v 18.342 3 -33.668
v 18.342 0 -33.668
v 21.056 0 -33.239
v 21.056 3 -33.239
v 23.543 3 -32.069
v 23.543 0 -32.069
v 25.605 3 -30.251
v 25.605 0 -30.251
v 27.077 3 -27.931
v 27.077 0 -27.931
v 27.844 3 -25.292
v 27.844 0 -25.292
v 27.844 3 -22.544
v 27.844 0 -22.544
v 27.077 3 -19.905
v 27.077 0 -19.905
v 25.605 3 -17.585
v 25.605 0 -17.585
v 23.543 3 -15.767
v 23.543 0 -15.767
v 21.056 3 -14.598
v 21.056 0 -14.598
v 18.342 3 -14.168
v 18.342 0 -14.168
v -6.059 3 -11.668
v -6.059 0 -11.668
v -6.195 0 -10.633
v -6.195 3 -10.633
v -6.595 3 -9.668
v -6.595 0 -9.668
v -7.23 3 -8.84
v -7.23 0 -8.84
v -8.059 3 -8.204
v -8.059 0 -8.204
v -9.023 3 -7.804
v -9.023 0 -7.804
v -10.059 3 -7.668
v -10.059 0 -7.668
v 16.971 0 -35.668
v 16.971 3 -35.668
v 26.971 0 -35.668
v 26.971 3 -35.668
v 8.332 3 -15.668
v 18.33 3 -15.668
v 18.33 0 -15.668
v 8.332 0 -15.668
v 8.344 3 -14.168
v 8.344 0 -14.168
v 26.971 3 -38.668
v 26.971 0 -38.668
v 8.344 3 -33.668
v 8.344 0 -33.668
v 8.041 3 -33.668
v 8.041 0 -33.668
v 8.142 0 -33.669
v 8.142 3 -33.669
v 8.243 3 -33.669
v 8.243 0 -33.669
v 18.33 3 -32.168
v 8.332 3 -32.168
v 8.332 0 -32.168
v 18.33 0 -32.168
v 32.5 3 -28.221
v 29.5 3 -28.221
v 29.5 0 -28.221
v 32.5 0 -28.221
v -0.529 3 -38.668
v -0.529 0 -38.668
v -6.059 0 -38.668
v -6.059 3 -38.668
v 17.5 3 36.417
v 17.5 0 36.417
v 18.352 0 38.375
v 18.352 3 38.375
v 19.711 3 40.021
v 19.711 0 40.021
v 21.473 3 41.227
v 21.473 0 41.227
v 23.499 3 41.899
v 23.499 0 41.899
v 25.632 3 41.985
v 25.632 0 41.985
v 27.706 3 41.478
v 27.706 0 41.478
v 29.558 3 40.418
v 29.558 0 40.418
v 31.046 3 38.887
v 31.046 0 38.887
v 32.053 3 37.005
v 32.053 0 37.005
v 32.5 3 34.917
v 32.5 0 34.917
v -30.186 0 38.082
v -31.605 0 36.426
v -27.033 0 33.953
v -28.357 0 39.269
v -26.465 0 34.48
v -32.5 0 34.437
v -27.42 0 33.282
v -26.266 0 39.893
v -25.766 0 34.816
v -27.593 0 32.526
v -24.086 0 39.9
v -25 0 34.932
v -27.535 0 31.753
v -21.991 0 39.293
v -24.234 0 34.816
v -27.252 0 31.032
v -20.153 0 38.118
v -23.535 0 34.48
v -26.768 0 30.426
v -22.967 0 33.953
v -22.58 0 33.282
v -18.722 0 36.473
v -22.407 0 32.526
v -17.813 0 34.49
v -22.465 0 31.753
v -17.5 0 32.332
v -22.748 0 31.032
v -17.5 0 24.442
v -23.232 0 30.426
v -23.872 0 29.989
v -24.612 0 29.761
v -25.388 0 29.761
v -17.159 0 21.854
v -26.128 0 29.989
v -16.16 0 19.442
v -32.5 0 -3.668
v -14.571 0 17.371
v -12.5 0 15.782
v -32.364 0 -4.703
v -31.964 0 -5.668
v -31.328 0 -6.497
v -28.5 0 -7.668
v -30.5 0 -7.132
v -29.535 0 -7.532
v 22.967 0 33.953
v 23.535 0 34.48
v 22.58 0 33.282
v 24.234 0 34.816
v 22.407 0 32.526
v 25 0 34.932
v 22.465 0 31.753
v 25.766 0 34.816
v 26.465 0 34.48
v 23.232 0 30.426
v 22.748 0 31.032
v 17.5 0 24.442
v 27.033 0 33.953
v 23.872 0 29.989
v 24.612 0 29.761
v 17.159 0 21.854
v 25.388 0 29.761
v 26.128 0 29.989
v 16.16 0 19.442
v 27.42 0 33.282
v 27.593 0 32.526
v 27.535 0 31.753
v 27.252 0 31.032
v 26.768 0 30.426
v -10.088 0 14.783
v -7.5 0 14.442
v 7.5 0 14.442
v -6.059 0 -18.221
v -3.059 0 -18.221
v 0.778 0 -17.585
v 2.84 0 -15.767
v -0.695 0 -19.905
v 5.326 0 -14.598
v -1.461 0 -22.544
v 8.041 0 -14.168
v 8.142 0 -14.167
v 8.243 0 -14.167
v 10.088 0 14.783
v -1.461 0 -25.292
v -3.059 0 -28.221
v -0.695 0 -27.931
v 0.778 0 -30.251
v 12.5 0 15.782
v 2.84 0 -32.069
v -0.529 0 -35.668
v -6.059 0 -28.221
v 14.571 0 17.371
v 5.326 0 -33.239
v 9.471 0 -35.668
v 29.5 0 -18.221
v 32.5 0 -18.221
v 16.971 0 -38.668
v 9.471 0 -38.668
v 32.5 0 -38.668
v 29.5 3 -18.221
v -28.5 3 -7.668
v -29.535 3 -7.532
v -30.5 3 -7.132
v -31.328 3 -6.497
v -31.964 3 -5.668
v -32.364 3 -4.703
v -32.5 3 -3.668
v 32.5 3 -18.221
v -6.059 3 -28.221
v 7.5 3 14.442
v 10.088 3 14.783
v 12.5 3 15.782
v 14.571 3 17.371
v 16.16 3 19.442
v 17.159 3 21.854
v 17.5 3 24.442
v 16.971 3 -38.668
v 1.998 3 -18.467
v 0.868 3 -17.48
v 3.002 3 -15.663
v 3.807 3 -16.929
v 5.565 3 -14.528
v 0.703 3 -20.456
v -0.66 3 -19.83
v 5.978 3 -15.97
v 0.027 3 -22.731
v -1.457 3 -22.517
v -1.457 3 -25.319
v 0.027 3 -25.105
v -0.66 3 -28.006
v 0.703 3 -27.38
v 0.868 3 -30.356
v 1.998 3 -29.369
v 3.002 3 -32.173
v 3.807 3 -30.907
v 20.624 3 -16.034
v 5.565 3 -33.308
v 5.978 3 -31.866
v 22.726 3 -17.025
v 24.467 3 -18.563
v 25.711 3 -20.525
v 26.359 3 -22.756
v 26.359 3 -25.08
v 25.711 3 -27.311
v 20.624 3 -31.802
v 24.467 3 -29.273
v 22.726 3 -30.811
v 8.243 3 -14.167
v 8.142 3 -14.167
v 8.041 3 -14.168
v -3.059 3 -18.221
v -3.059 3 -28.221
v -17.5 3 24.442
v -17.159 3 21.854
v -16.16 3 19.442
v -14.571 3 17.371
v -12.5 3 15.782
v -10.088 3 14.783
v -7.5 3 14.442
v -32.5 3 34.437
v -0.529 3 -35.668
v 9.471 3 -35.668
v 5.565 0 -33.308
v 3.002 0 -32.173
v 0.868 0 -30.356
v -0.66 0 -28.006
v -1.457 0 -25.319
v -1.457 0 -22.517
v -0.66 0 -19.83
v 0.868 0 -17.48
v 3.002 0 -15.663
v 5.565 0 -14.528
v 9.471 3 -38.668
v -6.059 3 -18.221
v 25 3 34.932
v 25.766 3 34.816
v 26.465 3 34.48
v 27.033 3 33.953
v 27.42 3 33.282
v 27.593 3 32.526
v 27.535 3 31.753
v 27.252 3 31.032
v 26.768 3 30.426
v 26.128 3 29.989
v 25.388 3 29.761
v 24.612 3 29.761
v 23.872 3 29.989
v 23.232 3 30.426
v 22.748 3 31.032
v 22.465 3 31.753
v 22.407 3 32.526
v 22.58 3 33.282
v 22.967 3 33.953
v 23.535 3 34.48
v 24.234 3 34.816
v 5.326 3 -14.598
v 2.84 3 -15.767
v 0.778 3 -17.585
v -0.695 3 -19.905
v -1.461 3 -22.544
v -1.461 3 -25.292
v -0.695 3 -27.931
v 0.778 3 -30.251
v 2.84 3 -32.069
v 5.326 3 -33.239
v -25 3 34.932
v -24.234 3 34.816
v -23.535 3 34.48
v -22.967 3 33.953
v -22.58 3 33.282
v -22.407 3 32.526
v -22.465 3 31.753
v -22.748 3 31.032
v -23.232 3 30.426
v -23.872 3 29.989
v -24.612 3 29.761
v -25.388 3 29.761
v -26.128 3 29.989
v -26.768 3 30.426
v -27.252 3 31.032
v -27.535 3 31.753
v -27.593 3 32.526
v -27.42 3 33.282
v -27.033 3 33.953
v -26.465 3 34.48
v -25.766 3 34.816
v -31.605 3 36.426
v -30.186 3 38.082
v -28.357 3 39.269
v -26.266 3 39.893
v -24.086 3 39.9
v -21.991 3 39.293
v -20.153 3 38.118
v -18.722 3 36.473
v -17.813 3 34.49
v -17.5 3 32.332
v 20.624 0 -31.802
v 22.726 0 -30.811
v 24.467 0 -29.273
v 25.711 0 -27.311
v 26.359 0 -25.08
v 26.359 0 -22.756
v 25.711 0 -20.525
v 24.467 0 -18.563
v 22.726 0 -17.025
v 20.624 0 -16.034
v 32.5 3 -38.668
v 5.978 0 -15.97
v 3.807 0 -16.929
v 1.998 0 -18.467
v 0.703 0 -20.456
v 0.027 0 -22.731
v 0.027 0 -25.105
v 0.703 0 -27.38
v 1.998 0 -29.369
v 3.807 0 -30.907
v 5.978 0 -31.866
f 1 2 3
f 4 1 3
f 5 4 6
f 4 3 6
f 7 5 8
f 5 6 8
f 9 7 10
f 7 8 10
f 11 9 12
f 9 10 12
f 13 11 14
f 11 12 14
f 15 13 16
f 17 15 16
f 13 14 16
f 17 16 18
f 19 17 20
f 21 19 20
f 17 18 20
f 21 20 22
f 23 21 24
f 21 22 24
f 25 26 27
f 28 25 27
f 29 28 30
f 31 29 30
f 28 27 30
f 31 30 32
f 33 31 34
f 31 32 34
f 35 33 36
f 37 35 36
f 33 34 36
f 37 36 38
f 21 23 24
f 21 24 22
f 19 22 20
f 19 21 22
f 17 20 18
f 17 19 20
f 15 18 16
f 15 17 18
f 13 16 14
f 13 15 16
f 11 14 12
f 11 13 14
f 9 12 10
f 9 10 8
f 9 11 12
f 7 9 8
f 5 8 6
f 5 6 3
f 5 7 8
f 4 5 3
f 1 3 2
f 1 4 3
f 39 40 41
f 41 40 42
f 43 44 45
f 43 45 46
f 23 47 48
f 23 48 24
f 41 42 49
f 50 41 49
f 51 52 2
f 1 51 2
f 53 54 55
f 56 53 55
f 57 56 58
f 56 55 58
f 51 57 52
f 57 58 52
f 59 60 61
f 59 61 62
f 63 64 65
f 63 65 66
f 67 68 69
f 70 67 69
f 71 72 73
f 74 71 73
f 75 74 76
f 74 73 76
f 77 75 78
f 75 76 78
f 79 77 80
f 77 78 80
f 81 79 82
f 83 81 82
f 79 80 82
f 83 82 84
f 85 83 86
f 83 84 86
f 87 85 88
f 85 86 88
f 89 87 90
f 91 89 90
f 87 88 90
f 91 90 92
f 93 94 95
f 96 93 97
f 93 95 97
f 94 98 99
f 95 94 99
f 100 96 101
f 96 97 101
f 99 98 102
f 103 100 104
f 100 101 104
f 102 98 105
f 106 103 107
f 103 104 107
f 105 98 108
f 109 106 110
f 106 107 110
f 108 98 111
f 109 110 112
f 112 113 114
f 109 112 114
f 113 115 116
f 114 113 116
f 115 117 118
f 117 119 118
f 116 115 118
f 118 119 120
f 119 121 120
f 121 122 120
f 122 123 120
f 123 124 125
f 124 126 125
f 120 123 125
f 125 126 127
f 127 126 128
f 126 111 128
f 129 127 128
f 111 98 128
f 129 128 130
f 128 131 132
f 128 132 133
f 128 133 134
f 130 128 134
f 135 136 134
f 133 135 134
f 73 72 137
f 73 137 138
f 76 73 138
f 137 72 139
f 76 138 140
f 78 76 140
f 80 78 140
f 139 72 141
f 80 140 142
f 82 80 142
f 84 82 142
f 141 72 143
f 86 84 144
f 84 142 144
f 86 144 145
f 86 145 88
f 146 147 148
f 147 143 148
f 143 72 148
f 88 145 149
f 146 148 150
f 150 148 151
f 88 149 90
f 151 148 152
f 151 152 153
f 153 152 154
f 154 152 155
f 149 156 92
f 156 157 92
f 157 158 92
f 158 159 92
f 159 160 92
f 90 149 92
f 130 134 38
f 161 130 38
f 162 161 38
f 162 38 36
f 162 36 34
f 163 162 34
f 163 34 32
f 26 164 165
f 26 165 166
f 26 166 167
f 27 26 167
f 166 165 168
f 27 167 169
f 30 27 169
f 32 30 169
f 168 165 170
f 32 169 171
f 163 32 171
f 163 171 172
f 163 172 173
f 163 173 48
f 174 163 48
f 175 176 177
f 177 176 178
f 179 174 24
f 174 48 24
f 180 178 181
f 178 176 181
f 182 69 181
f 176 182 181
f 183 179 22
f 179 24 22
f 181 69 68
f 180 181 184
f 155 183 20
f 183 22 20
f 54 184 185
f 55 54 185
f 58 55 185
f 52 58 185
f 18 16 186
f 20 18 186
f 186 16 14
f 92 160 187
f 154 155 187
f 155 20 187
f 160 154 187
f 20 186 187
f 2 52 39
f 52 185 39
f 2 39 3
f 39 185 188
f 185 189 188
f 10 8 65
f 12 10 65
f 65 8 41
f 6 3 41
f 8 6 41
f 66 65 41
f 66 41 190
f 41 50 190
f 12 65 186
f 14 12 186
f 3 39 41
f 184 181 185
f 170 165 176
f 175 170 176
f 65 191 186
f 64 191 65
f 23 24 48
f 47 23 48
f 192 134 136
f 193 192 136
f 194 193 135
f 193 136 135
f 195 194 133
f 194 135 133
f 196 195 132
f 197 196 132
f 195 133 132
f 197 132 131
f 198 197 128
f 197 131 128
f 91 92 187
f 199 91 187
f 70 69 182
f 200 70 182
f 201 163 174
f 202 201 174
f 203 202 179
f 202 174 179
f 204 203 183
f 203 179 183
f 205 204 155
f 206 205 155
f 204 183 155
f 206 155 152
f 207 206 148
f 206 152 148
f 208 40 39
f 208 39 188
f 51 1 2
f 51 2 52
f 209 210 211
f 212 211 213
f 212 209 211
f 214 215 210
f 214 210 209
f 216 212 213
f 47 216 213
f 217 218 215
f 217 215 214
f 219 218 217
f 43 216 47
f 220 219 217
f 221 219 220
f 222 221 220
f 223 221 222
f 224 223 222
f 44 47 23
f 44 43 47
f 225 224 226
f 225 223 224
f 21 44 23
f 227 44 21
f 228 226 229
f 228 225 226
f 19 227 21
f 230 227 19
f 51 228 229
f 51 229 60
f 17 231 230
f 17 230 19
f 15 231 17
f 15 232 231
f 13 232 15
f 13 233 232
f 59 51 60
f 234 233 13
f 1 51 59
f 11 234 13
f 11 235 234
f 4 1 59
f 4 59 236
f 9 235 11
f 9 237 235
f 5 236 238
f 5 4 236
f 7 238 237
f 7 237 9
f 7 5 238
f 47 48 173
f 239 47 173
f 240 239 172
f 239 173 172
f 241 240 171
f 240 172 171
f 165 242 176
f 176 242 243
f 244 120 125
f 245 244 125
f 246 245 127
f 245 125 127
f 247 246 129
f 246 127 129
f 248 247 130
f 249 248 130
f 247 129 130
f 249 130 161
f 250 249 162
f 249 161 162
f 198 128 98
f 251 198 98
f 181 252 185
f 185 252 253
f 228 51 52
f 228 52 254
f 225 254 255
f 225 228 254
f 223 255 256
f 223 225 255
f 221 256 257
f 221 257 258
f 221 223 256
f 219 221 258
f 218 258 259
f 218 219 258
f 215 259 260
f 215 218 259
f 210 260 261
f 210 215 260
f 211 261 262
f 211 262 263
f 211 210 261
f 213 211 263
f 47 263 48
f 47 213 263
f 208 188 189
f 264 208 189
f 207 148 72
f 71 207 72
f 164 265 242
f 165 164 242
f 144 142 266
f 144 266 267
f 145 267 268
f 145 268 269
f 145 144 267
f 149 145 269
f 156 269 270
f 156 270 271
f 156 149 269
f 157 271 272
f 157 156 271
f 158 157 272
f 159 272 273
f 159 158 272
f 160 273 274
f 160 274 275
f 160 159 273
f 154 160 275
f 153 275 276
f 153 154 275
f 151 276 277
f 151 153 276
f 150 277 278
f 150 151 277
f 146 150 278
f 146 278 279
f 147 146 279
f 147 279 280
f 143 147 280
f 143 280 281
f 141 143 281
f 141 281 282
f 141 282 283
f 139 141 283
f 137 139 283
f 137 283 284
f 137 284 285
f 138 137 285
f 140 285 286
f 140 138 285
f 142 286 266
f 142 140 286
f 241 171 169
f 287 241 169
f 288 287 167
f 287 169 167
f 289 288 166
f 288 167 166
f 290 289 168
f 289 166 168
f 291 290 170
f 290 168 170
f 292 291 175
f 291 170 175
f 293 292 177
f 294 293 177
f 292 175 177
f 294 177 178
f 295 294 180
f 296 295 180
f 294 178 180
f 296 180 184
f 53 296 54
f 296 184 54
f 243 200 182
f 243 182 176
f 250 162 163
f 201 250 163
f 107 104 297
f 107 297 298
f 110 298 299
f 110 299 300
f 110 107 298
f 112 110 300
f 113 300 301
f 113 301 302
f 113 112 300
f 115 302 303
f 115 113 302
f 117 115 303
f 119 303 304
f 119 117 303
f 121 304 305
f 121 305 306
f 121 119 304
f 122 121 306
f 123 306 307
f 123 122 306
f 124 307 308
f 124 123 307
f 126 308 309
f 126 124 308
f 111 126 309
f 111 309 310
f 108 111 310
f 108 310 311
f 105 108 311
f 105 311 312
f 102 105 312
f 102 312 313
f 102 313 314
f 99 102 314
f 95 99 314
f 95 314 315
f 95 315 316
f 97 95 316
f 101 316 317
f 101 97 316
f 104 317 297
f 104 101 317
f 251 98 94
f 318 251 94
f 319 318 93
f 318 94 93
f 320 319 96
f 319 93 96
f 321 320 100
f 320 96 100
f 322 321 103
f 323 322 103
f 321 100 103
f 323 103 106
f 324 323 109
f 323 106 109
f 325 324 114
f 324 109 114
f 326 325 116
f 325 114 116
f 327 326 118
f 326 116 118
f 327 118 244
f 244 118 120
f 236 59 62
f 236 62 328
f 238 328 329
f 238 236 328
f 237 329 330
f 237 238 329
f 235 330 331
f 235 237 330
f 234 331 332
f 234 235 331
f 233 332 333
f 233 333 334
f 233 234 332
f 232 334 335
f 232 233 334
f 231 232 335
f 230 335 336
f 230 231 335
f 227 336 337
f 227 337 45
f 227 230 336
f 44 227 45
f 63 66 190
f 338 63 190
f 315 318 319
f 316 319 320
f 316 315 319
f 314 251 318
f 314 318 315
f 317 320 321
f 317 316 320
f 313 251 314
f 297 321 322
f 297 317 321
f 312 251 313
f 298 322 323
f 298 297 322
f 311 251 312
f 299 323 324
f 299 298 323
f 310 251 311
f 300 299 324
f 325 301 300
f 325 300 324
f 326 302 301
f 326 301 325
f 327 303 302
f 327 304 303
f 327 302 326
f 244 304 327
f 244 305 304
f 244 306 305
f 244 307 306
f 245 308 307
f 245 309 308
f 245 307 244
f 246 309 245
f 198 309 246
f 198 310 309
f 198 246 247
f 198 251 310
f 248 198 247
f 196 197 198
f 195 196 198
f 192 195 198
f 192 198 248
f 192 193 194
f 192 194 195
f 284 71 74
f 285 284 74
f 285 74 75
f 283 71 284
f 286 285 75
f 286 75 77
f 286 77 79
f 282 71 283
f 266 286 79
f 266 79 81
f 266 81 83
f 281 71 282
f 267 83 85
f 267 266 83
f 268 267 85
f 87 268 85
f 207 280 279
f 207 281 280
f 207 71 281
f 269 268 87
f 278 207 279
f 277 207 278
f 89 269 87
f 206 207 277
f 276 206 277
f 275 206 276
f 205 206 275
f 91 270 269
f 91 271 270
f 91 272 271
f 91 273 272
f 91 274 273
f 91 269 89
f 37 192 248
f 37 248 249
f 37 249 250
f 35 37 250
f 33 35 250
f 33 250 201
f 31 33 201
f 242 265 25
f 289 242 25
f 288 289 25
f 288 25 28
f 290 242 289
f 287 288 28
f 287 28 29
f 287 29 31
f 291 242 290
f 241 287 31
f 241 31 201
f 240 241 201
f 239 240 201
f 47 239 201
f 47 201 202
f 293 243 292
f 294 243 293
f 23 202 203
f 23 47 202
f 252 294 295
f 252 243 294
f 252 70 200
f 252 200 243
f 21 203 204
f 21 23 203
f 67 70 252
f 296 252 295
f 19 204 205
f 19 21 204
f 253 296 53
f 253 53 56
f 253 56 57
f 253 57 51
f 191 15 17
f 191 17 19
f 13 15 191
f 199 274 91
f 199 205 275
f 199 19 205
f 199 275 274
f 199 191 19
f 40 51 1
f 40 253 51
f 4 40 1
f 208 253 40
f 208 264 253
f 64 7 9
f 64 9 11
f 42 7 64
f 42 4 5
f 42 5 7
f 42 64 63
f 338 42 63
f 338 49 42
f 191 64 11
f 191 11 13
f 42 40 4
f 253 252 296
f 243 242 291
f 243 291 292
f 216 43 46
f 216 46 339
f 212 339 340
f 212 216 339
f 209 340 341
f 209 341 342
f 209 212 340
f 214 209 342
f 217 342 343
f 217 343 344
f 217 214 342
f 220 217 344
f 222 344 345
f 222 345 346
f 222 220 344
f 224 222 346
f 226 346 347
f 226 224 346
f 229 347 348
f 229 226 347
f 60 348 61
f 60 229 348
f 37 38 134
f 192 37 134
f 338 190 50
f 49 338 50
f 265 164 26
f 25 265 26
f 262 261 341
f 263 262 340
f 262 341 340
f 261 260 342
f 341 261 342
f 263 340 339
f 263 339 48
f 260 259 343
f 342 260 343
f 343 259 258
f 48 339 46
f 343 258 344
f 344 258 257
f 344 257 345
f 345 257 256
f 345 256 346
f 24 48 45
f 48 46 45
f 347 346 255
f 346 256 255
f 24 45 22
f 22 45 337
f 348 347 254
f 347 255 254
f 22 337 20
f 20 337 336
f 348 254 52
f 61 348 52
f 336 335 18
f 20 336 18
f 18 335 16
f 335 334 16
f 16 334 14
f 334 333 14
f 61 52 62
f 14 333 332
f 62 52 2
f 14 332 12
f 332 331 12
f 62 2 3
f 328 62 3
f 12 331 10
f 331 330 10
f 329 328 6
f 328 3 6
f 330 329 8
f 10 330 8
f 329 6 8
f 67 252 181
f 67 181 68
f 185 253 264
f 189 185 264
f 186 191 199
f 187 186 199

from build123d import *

# Parameters (mm, degrees)
SKETCH1_R           = 2.6
BOSS_EXTRUDE1_DEPTH = 3
SKETCH2_W           = 10
SKETCH2_H           = 3
SKETCH2_W_2         = 3
SKETCH2_H_2         = 10
CUT_EXTRUDE1_DEPTH  = 3
BOSS_EXTRUDE2_DEPTH = 3


with BuildPart() as part:
    # Sketch1 → Boss-Extrude1 (new body)
    with BuildSketch(Plane(origin=(0, 0, 0), x_dir=(1, 0, 0), z_dir=(0, 1, 0))):
        with BuildLine():
            Line((-32.5, -1.331915835), (-32.5, -34.437048929))
            ThreePointArc((-32.5, -34.437048929), (-24.085532921, -39.90046288), (-17.5, -32.331915835))
            Line((-17.5, -32.331915835), (-17.5, -24.442231617))
            ThreePointArc((-17.5, -24.442231617), (-14.571067812, -17.371163805), (-7.5, -14.442231617))
            Line((-7.5, -14.442231617), (7.5, -14.442231617))
            ThreePointArc((7.5, -14.442231617), (14.571067812, -17.371163805), (17.5, -24.442231617))
            Line((17.5, -24.442231617), (17.5, -32.331915835))
            Line((17.5, -32.331915835), (17.5, -36.417098288))
            ThreePointArc((17.5, -36.417098288), (25.631797985, -41.985078136), (32.5, -34.917098288))
            Line((32.5, -34.917098288), (32.5, -33.831915835))
            Line((32.5, -33.831915835), (32.5, -1.331915835))
            Line((32.5, -1.331915835), (32.5, 3.668084165))
            Line((32.5, 3.668084165), (32.5, 38.668084165))
            Line((32.5, 38.668084165), (32.441371292, 38.668084165))
            Line((32.441371292, 38.668084165), (-6.058628708, 38.668084165))
            Line((-6.058628708, 38.668084165), (-6.058628708, 14.168084165))
            Line((-6.058628708, 14.168084165), (-6.058628708, 11.668084165))
            ThreePointArc((-6.058628708, 11.668084165), (-7.230201584, 8.83965704), (-10.058628708, 7.668084165))
            Line((-10.058628708, 7.668084165), (-28.5, 7.668084165))
            ThreePointArc((-28.5, 7.668084165), (-31.328427125, 6.49651129), (-32.5, 3.668084165))
            Line((-32.5, 3.668084165), (-32.5, 3.101498414))
            Line((-32.5, 3.101498414), (-32.5, -1.331915835))
        make_face()
        with Locations(Location((-25, -32.331915835, 0), (0, 0, 270))):
            Circle(SKETCH1_R, mode=Mode.SUBTRACT)
        with Locations(Location((25, -32.331915835, 0), (0, 0, 270))):
            Circle(SKETCH1_R, mode=Mode.SUBTRACT)
        with BuildLine():
            ThreePointArc((8.344321377, 14.168084165), (8.192552441, 14.166903015), (8.040783506, 14.168084165))
            ThreePointArc((8.040783506, 14.168084165), (-1.558628708, 23.918084165), (8.040783506, 33.668084165))
            ThreePointArc((8.040783506, 33.668084165), (8.192552441, 33.669265314), (8.344321377, 33.668084165))
            Line((8.344321377, 33.668084165), (18.341959078, 33.668084165))
            ThreePointArc((18.341959078, 33.668084165), (27.941371292, 23.918084165), (18.341959078, 14.168084165))
            Line((18.341959078, 14.168084165), (8.344321377, 14.168084165))
        make_face(mode=Mode.SUBTRACT)
    extrude(amount=BOSS_EXTRUDE1_DEPTH)

    # Sketch2 → Cut-Extrude1 (cut)
    with BuildSketch(Plane(origin=(0, 3, 0), x_dir=(1, 0, 0), z_dir=(0, 1, 0))):
        with Locations((4.470685646, 37.168084165)):
            Rectangle(SKETCH2_W, SKETCH2_H)
        with Locations((-4.558628708, 23.22062572)):
            Rectangle(SKETCH2_W_2, SKETCH2_H_2)
        with Locations((21.970685646, 37.168084165)):
            Rectangle(SKETCH2_W, SKETCH2_H)
        with Locations((31, 23.22062572)):
            Rectangle(SKETCH2_W_2, SKETCH2_H_2)
    extrude(amount=-CUT_EXTRUDE1_DEPTH, mode=Mode.SUBTRACT)


with BuildPart() as body_2:
    # Sketch4 → Boss-Extrude2 (new body)
    with BuildSketch(Plane(origin=(0, 3, 0), x_dir=(1, 0, 0), z_dir=(0, 1, 0))):
        with BuildLine():
            ThreePointArc((8.344321377, 33.668084165), (-1.558628708, 23.918084165), (8.344321377, 14.168084165))
            Line((8.344321377, 14.168084165), (18.341959078, 14.168084165))
            ThreePointArc((18.341959078, 14.168084165), (27.941371292, 23.918084165), (18.341959078, 33.668084165))
            Line((18.341959078, 33.668084165), (8.344321377, 33.668084165))
        make_face()
        with BuildLine():
            ThreePointArc((8.332160325, 15.668084165), (-0.058628708, 23.918084165), (8.332160325, 32.168084165))
            Line((8.332160325, 32.168084165), (18.329798027, 32.168084165))
            ThreePointArc((18.329798027, 32.168084165), (26.441371292, 23.918084165), (18.329798027, 15.668084165))
            Line((18.329798027, 15.668084165), (8.332160325, 15.668084165))
        make_face(mode=Mode.SUBTRACT)
    extrude(amount=-BOSS_EXTRUDE2_DEPTH)


solid = Compound([part.part, body_2.part])
